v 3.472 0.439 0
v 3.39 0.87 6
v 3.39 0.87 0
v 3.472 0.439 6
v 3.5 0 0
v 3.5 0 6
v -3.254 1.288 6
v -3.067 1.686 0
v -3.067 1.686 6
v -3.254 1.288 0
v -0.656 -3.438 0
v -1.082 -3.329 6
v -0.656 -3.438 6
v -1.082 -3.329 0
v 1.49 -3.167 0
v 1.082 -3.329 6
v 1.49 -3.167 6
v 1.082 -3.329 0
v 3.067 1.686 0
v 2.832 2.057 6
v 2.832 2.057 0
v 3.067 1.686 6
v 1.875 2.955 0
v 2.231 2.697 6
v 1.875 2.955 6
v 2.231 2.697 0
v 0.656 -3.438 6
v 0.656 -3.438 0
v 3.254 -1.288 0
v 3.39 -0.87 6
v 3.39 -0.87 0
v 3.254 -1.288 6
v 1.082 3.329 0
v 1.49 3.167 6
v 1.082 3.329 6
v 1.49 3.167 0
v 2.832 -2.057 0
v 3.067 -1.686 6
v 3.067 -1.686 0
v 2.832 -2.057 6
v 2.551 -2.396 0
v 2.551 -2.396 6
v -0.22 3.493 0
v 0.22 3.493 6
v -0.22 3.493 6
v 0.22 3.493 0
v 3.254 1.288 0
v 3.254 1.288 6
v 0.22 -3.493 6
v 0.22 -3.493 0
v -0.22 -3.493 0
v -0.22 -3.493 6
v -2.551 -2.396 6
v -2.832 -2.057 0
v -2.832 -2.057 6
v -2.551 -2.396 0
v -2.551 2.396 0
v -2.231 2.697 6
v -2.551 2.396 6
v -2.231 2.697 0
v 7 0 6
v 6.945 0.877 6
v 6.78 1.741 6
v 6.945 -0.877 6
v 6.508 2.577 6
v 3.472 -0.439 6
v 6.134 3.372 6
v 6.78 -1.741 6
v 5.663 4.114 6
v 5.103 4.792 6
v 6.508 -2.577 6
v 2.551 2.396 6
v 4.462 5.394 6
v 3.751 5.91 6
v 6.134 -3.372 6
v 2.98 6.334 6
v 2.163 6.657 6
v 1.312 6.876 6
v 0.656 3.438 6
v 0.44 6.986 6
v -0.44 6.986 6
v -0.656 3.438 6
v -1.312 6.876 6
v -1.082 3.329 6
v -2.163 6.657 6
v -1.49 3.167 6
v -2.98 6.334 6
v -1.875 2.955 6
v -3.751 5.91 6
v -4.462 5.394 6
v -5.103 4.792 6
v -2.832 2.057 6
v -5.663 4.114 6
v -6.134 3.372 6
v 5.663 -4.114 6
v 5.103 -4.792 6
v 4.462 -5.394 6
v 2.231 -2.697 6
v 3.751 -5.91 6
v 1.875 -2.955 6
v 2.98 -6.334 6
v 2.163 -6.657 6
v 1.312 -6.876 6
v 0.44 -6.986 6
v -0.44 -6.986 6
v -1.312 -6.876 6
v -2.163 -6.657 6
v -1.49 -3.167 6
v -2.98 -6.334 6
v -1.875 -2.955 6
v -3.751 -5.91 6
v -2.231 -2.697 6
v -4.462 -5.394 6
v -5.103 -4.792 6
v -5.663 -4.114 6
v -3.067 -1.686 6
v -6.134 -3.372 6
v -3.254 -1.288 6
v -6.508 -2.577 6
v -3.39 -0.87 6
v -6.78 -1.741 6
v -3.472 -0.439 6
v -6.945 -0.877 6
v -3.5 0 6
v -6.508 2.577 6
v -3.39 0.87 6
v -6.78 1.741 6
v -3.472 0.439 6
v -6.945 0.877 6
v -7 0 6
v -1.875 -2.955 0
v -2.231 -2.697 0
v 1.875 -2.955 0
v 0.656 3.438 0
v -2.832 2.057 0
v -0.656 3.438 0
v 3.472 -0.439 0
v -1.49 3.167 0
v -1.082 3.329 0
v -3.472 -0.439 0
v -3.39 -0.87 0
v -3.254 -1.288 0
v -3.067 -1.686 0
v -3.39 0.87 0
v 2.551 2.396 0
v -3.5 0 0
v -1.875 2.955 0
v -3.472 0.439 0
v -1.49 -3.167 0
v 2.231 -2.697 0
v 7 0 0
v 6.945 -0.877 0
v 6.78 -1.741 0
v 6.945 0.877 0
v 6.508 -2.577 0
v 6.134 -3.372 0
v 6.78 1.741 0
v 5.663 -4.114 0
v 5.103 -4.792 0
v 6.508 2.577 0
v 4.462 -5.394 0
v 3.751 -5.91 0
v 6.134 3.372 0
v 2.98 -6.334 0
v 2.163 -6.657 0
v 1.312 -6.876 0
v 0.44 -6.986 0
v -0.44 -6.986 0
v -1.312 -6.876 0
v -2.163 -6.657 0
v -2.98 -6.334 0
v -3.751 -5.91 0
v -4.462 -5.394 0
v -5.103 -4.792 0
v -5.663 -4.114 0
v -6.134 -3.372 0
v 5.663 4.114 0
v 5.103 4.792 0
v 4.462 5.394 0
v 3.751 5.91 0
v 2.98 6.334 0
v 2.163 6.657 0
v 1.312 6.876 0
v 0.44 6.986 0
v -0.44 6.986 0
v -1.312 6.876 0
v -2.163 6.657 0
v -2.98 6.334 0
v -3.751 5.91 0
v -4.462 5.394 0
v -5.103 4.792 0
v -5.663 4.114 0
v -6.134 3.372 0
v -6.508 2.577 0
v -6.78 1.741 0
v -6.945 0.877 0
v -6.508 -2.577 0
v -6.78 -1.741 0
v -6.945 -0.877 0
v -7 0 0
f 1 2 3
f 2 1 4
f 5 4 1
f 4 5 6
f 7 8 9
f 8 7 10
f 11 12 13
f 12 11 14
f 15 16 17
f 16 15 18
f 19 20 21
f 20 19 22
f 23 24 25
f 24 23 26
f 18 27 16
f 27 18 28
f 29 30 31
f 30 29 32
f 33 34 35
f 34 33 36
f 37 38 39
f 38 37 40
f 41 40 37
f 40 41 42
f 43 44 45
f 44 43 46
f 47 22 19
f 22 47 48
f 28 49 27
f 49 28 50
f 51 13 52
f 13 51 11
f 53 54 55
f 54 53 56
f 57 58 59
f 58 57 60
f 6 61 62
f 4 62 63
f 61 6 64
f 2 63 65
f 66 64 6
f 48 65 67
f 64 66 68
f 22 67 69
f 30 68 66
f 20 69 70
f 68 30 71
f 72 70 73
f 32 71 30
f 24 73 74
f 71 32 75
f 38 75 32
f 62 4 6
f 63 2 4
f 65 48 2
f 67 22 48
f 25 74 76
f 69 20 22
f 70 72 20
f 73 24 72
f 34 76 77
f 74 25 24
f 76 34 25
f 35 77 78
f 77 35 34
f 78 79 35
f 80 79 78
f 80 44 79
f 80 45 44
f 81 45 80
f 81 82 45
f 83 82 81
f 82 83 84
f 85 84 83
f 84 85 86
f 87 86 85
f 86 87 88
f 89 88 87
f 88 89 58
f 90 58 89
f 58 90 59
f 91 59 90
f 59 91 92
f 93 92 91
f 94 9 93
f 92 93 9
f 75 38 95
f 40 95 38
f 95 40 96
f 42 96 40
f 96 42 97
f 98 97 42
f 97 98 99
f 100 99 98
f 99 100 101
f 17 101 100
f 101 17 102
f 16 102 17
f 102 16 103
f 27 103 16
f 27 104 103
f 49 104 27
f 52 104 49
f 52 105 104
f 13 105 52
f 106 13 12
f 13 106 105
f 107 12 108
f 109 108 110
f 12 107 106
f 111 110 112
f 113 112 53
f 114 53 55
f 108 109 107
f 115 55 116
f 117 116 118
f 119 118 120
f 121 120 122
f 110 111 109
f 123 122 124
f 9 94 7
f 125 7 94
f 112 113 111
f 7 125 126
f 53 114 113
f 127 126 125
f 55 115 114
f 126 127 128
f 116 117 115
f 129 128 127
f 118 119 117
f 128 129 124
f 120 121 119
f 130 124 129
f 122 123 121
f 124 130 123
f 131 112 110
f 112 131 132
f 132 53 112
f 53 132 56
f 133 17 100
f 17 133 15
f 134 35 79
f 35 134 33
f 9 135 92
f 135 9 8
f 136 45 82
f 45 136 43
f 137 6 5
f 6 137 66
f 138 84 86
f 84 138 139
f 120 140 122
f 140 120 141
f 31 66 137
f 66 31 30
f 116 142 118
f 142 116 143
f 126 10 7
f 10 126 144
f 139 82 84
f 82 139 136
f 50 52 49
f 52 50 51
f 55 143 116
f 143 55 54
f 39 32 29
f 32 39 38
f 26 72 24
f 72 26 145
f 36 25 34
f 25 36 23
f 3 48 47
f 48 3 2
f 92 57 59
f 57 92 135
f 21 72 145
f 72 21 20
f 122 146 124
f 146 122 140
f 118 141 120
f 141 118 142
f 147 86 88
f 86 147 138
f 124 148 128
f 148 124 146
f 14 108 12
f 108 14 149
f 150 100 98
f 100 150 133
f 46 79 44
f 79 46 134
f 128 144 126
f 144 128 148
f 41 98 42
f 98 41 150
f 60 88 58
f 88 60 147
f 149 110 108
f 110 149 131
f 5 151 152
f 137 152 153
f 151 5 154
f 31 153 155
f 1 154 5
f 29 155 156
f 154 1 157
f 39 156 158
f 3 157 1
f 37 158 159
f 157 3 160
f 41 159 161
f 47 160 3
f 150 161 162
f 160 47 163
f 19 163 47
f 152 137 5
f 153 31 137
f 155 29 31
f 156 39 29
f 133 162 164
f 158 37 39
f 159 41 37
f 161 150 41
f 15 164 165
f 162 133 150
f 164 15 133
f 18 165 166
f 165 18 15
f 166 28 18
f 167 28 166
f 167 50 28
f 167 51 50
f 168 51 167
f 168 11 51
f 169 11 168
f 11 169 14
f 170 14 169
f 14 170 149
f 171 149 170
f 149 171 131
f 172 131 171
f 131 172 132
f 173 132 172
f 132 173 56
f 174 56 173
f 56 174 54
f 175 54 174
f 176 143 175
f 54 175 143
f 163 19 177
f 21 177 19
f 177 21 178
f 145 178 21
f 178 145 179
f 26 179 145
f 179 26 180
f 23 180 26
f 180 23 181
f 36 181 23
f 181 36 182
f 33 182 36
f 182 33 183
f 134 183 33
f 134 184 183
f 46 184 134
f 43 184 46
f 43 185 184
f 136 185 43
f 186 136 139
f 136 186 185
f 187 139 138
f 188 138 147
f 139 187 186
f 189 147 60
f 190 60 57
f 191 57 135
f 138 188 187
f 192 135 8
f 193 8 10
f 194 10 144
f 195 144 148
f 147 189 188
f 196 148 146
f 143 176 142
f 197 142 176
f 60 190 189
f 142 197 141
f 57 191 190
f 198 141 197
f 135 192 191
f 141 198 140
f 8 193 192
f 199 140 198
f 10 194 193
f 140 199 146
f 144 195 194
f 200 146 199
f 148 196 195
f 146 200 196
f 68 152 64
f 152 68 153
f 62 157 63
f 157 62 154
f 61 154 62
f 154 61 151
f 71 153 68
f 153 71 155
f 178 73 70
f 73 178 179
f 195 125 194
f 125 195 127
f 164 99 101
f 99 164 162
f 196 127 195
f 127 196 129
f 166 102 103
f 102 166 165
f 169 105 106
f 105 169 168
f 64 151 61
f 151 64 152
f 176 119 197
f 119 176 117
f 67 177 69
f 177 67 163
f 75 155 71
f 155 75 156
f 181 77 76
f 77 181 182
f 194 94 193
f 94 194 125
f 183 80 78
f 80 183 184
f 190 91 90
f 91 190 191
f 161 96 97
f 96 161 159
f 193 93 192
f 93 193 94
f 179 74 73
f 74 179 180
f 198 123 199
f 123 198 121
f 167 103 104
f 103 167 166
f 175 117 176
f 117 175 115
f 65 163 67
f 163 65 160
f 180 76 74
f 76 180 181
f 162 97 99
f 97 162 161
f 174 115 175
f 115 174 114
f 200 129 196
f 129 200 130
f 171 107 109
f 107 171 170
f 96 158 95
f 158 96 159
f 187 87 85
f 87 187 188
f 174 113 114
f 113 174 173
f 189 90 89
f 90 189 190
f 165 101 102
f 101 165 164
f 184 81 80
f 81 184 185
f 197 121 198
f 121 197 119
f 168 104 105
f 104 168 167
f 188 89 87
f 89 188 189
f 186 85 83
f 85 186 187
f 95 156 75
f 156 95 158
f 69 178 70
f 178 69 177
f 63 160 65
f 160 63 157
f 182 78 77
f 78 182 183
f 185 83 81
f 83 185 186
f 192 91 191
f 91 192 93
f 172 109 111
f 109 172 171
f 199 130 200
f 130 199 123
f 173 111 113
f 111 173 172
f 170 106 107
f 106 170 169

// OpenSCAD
$fn = 50;


difference() {
	union() {
		cylinder(h = 6, r = 7.0000000000);
	}
	union() {
		#translate(v = [0.0000000000, 0.0000000000, -100.0000000000]) {
			cylinder(h = 200, r = 3.0000000000);
		}
		#translate(v = [0.0000000000, 0.0000000000, -100.0000000000]) {
			cylinder(h = 200, r = 3.0000000000);
		}
		#translate(v = [0.0000000000, 0.0000000000, -100.0000000000]) {
			cylinder(h = 200, r = 3.0000000000);
		}
		#translate(v = [0.0000000000, 0.0000000000, -100.0000000000]) {
			cylinder(h = 200, r = 3.0000000000);
		}
		#cylinder(h = 6, r = 3.5000000000);
	}
}
